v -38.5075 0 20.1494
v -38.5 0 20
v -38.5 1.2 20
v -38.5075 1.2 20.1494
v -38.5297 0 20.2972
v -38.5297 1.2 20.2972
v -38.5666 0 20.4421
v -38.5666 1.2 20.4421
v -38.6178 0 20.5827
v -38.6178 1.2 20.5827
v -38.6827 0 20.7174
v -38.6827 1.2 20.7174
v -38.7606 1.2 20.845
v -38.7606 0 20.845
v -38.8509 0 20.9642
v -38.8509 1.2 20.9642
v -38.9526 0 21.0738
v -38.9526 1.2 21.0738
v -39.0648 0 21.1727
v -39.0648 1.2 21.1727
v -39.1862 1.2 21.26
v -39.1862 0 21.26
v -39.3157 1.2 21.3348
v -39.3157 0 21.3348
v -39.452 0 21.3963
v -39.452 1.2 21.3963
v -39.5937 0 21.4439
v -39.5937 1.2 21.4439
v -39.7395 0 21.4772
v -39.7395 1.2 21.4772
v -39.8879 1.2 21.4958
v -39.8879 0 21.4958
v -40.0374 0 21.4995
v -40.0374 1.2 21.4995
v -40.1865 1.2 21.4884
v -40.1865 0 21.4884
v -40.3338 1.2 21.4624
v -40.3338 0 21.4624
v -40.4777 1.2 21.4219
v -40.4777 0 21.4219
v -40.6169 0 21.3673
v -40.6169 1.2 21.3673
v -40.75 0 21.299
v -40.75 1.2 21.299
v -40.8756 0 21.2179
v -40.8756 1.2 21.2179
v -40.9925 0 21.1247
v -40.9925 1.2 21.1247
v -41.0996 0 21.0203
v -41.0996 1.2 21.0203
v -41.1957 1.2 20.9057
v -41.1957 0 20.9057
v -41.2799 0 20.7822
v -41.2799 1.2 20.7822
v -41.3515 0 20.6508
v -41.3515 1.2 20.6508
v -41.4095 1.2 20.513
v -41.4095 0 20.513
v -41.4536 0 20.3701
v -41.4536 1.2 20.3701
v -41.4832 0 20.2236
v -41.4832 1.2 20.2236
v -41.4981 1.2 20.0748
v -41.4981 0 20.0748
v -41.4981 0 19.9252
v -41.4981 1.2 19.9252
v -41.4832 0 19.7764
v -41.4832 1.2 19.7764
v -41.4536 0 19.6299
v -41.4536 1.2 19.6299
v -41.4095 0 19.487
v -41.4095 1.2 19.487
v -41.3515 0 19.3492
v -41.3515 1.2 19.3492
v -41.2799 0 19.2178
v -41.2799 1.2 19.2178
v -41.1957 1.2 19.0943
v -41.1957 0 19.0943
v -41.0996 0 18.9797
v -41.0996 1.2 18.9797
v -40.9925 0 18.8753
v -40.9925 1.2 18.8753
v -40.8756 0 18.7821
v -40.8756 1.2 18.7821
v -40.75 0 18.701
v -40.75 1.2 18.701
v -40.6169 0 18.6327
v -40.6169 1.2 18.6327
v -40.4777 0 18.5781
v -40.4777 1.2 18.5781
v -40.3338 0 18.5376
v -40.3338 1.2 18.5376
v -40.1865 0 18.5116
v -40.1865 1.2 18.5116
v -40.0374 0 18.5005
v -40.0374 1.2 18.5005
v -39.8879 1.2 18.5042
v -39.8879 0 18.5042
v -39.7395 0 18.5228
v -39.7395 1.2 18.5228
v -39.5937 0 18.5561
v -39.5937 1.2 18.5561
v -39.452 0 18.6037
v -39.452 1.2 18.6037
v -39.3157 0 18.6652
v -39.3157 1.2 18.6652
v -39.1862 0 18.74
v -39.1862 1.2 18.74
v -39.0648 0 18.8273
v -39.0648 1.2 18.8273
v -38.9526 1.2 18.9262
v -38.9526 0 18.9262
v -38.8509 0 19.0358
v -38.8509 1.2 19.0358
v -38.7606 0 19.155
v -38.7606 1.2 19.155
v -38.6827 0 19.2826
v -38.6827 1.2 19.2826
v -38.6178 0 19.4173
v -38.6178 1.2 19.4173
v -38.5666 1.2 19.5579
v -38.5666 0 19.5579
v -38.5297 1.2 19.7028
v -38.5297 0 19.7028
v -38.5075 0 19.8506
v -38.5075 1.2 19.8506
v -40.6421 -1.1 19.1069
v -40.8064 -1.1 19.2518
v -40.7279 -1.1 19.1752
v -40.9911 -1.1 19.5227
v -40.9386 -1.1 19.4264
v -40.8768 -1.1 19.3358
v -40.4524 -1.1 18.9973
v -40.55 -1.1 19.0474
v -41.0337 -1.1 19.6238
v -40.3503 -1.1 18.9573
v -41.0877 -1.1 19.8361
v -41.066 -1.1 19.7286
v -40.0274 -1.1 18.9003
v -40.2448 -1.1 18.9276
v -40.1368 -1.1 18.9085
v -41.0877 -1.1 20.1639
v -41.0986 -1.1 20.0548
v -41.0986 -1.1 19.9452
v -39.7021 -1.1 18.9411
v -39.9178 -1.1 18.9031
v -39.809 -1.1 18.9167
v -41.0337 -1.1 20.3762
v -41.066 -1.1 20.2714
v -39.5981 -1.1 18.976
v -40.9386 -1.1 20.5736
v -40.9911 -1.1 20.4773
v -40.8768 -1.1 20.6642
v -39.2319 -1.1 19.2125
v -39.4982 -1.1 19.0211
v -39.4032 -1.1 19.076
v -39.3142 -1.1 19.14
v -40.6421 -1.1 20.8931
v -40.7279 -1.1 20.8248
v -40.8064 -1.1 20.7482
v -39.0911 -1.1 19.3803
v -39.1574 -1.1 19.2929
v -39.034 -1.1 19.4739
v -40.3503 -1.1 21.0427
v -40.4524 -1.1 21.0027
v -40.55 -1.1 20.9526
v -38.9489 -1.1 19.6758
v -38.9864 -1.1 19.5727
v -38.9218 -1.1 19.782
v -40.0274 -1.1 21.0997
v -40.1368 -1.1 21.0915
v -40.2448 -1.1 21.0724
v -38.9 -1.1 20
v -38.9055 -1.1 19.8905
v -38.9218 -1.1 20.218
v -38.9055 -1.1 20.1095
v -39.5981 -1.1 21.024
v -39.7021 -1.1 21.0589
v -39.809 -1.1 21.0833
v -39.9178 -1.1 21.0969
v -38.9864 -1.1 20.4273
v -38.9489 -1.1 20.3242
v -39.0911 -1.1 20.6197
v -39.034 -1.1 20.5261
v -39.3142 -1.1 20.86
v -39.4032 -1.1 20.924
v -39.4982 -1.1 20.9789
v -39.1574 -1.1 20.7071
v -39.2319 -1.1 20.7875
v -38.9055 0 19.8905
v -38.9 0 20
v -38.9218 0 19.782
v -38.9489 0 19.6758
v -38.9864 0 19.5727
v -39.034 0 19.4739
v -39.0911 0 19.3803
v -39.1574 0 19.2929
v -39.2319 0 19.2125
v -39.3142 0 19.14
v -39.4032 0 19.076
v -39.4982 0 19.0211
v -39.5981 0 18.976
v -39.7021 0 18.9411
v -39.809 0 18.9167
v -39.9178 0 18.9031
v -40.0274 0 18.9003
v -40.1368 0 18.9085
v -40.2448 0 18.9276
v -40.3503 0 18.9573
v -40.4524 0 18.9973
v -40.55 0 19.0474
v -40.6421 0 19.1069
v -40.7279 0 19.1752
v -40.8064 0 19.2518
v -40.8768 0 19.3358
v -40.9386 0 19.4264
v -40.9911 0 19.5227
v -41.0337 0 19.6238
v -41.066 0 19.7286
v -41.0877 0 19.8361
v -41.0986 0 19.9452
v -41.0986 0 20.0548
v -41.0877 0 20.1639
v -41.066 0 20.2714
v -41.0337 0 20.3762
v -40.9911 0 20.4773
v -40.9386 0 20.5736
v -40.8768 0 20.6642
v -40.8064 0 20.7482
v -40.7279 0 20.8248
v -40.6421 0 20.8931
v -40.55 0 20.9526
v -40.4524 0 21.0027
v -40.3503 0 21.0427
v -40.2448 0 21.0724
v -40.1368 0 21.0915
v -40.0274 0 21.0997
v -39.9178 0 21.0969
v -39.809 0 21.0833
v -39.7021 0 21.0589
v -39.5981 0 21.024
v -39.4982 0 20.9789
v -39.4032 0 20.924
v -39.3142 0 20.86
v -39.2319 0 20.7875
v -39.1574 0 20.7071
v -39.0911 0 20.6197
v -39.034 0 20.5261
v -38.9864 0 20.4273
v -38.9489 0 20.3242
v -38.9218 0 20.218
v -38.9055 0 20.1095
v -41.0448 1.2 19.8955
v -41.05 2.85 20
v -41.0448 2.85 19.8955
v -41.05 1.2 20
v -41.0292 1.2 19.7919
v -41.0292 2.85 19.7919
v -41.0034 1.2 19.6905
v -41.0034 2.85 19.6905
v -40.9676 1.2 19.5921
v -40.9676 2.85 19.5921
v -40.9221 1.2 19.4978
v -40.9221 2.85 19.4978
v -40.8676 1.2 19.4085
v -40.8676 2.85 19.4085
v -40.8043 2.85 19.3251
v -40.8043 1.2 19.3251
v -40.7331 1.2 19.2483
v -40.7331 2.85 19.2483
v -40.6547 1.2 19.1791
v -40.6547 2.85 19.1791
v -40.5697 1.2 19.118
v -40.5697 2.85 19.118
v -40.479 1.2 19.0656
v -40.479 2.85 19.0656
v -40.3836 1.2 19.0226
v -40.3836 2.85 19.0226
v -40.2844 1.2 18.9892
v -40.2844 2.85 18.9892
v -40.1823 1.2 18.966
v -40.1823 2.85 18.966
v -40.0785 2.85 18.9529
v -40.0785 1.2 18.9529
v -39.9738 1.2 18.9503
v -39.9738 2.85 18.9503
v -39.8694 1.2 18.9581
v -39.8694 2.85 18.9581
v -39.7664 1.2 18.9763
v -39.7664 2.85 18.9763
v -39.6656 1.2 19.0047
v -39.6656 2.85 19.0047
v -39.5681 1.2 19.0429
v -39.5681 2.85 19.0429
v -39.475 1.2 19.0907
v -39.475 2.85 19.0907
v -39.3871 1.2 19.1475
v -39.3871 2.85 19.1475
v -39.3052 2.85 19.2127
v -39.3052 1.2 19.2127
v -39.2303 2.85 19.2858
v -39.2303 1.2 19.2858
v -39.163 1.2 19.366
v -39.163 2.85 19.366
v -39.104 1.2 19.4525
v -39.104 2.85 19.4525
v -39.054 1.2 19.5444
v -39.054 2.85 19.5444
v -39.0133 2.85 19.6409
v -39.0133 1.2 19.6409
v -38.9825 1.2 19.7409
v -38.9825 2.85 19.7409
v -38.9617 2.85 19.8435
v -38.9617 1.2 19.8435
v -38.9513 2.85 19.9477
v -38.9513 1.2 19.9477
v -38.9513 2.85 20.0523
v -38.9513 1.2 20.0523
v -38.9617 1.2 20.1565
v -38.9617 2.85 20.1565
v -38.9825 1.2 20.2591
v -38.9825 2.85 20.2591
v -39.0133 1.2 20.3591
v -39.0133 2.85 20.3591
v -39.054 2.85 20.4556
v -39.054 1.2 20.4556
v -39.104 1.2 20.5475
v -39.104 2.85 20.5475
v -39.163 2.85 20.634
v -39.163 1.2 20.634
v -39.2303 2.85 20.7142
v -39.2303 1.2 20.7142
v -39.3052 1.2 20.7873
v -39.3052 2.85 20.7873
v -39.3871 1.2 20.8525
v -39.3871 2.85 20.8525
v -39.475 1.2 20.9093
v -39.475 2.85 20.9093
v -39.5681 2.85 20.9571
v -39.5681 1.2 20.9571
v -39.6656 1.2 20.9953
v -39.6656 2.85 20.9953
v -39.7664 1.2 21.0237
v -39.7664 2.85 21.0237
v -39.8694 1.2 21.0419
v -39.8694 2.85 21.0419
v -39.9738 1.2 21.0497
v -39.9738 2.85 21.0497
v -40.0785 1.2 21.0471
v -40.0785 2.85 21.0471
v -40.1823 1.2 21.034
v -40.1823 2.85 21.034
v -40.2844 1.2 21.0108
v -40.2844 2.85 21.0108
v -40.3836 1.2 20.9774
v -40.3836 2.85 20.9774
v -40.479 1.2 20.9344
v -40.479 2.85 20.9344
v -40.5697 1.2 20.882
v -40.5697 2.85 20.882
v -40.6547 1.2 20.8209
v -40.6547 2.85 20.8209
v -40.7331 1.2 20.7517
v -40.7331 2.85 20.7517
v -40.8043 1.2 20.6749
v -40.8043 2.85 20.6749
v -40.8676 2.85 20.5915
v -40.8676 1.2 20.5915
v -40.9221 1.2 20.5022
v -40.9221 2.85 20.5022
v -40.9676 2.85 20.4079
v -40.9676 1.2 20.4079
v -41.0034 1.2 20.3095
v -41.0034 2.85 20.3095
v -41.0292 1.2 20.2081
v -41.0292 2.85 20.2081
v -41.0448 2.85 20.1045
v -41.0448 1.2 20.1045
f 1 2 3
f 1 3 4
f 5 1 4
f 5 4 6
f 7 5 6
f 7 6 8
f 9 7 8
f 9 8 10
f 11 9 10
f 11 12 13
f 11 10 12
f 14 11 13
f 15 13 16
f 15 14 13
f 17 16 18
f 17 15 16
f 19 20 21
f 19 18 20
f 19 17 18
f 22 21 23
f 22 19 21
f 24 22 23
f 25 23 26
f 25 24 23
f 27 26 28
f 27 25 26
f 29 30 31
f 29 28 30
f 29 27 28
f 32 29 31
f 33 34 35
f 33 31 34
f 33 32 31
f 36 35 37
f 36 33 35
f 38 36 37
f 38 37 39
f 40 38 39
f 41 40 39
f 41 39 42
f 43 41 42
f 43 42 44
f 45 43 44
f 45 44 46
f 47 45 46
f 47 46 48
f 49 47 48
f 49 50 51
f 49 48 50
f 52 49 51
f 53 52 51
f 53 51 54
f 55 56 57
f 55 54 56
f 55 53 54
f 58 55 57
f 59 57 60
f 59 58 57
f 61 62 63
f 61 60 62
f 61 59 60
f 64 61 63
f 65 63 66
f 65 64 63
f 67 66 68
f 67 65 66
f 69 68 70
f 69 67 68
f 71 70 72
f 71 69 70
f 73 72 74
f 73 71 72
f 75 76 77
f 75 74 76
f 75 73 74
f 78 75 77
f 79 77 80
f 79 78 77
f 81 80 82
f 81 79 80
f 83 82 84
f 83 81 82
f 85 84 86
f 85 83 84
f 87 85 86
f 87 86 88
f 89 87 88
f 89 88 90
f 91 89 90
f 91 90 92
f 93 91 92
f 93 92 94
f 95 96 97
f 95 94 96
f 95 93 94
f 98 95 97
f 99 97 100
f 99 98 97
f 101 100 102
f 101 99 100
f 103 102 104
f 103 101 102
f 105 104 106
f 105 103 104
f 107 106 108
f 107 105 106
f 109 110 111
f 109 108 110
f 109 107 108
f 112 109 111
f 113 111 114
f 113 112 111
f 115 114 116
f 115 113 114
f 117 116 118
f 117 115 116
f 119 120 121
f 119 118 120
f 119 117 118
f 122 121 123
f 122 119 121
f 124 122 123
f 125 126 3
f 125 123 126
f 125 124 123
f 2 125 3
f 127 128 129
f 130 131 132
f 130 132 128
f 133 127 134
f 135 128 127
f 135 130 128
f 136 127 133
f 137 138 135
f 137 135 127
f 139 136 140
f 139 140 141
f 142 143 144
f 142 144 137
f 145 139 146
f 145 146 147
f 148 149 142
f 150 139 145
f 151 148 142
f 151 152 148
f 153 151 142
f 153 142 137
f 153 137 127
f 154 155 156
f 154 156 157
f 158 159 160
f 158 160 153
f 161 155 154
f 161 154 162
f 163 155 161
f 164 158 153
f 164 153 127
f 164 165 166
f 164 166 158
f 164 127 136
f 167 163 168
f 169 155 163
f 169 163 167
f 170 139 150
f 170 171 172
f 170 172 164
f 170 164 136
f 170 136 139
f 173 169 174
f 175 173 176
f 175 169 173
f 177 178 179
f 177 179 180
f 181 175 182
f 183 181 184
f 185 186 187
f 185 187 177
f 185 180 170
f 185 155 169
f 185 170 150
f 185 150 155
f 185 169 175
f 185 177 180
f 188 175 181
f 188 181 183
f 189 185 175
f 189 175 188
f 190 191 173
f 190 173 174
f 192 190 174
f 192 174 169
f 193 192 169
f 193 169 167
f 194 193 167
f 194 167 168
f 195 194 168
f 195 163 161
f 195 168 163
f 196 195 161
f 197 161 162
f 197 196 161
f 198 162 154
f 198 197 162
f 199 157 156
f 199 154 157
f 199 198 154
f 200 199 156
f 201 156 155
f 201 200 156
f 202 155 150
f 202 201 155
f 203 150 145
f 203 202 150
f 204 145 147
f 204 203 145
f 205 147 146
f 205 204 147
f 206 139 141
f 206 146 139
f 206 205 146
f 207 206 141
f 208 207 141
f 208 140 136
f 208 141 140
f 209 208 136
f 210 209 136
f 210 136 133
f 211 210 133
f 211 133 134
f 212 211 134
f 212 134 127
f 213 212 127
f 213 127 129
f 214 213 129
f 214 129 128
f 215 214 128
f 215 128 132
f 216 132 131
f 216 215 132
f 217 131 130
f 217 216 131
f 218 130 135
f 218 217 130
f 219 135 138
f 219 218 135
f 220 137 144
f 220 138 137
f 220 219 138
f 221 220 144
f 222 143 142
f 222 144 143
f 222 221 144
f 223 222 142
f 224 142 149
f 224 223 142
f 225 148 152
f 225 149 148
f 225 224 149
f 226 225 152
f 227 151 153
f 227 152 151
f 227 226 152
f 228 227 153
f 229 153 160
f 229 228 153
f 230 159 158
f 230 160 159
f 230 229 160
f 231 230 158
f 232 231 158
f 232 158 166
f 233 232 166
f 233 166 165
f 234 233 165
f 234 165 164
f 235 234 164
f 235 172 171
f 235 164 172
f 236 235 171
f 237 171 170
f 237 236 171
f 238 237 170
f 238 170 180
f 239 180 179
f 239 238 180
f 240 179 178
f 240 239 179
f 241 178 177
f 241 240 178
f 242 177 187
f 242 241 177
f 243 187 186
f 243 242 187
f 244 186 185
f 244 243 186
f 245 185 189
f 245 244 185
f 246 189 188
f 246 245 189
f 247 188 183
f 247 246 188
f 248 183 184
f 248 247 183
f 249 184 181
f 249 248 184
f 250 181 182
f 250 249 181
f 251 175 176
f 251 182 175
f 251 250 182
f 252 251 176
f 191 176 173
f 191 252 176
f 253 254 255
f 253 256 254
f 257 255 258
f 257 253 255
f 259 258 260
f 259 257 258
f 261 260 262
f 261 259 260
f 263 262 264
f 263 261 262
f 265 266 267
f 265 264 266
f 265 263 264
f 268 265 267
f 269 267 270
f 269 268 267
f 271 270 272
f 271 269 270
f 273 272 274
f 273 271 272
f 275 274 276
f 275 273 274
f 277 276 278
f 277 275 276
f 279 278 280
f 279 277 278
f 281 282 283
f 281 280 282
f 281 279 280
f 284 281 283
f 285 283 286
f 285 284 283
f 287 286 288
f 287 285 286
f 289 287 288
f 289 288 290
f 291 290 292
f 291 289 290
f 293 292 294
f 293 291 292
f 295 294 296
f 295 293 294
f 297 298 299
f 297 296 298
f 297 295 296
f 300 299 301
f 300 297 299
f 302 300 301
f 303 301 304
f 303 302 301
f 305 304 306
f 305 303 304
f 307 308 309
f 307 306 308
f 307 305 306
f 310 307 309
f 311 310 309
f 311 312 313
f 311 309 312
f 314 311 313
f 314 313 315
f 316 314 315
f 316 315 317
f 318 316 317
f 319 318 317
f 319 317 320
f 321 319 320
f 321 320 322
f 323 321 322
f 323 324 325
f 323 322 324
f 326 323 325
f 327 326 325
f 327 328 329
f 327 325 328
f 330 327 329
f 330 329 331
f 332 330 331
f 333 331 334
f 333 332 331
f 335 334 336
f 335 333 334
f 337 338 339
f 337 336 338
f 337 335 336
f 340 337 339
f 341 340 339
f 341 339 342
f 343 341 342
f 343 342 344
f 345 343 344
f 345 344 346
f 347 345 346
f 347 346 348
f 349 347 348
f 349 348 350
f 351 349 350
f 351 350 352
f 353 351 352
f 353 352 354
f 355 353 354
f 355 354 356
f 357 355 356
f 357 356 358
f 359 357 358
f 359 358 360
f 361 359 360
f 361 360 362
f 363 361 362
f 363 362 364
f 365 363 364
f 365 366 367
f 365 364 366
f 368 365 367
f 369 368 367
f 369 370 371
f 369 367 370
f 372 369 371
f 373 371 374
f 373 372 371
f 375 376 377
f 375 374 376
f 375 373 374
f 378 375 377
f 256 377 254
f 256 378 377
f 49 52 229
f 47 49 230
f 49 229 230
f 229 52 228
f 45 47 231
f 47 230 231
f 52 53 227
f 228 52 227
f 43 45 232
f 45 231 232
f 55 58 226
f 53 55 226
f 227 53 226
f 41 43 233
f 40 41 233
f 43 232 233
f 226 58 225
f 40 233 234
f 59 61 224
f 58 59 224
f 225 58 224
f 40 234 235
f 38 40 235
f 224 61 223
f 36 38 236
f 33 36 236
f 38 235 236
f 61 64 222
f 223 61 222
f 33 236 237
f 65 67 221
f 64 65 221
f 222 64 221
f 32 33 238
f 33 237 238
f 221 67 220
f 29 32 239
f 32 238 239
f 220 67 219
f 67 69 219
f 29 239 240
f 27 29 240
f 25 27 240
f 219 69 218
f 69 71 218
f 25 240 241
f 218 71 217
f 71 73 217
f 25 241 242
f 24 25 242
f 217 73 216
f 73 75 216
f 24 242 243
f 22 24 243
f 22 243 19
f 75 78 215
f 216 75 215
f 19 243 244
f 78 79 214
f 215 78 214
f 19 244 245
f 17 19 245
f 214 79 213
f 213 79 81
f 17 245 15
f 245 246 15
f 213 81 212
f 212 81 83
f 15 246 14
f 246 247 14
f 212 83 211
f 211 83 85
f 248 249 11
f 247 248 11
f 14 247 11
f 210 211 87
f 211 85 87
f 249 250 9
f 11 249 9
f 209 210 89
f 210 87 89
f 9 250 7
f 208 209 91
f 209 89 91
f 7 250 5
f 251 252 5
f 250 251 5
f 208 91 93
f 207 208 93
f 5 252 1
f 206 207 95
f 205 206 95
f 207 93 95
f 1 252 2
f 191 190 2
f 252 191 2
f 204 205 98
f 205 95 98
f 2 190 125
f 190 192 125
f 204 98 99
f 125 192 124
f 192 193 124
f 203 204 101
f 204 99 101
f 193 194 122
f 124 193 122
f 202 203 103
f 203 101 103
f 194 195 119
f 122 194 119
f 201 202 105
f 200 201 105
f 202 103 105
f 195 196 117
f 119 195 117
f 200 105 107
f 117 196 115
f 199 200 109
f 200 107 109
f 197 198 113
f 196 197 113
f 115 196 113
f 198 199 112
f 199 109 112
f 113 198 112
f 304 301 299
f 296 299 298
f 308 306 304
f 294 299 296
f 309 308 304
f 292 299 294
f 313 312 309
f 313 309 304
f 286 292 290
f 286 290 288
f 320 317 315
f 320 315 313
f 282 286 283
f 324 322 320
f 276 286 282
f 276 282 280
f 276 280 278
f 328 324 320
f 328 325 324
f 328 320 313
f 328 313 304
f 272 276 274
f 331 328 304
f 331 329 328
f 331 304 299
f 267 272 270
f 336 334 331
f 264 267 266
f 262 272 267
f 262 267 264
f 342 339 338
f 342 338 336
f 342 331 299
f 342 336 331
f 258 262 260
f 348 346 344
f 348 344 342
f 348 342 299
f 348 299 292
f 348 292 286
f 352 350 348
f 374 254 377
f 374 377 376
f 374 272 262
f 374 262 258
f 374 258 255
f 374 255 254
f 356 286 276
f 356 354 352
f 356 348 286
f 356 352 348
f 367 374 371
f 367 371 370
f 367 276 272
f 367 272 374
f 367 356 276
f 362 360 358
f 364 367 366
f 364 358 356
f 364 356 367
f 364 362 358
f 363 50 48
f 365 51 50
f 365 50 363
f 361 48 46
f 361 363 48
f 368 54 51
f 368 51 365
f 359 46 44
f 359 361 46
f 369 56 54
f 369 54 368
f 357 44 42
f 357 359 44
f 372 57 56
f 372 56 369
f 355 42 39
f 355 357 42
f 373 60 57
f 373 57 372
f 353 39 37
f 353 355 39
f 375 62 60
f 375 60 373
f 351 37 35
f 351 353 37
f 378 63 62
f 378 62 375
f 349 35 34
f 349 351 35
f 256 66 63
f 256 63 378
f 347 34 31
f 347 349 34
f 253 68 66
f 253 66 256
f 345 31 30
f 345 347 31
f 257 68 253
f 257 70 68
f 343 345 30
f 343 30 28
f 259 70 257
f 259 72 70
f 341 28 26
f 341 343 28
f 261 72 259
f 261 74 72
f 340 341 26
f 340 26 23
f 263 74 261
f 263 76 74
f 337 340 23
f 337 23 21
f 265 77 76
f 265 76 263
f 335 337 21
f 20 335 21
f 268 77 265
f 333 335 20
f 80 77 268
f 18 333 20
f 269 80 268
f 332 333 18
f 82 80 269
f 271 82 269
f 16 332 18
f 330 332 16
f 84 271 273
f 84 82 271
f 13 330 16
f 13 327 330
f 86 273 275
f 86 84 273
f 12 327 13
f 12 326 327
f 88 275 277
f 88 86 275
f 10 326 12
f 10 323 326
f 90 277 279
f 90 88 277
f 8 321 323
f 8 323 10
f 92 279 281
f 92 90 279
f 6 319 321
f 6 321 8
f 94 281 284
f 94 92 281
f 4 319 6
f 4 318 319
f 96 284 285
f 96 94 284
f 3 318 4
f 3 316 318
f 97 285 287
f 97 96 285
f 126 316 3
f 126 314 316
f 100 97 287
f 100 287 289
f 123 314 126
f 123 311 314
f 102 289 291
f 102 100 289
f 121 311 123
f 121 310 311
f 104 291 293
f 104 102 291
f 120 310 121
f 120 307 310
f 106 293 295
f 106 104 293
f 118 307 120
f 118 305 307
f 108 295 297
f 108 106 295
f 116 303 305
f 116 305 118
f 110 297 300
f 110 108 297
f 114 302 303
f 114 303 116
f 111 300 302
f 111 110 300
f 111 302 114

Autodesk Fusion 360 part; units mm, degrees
sketch "Sketch1" plane through (0, 0, 0) normal (0, 1, 0) x (1, 0, 0)
  circle A0 centre (-40, -20) radius 1.5
  dimension "d1" = 3
extrude "Extrude1" add sketch "Sketch1" along normal blind 1.2
sketch "Sketch2" plane through (0, 0, 0) normal (0, -1, 0) x (1, 0, 0)
  circle A0 centre (-40, 20) radius 1.5
  circle A1 centre (-40, 20) radius 1.1
  dimension "d4" = 2.2
extrude "Extrude2" add sketch "Sketch2" along normal blind 1.1 contours A1
sketch "Sketch3" plane through (0, 1.2, 0) normal (0, 1, 0) x (-1, 0, 0)
  circle A0 centre (40, 20) radius 1.5
  circle A1 centre (40, 20) radius 1.05
  dimension "d7" = 2.1
extrude "Extrude3" add sketch "Sketch3" along normal blind 1.65 contours A1
